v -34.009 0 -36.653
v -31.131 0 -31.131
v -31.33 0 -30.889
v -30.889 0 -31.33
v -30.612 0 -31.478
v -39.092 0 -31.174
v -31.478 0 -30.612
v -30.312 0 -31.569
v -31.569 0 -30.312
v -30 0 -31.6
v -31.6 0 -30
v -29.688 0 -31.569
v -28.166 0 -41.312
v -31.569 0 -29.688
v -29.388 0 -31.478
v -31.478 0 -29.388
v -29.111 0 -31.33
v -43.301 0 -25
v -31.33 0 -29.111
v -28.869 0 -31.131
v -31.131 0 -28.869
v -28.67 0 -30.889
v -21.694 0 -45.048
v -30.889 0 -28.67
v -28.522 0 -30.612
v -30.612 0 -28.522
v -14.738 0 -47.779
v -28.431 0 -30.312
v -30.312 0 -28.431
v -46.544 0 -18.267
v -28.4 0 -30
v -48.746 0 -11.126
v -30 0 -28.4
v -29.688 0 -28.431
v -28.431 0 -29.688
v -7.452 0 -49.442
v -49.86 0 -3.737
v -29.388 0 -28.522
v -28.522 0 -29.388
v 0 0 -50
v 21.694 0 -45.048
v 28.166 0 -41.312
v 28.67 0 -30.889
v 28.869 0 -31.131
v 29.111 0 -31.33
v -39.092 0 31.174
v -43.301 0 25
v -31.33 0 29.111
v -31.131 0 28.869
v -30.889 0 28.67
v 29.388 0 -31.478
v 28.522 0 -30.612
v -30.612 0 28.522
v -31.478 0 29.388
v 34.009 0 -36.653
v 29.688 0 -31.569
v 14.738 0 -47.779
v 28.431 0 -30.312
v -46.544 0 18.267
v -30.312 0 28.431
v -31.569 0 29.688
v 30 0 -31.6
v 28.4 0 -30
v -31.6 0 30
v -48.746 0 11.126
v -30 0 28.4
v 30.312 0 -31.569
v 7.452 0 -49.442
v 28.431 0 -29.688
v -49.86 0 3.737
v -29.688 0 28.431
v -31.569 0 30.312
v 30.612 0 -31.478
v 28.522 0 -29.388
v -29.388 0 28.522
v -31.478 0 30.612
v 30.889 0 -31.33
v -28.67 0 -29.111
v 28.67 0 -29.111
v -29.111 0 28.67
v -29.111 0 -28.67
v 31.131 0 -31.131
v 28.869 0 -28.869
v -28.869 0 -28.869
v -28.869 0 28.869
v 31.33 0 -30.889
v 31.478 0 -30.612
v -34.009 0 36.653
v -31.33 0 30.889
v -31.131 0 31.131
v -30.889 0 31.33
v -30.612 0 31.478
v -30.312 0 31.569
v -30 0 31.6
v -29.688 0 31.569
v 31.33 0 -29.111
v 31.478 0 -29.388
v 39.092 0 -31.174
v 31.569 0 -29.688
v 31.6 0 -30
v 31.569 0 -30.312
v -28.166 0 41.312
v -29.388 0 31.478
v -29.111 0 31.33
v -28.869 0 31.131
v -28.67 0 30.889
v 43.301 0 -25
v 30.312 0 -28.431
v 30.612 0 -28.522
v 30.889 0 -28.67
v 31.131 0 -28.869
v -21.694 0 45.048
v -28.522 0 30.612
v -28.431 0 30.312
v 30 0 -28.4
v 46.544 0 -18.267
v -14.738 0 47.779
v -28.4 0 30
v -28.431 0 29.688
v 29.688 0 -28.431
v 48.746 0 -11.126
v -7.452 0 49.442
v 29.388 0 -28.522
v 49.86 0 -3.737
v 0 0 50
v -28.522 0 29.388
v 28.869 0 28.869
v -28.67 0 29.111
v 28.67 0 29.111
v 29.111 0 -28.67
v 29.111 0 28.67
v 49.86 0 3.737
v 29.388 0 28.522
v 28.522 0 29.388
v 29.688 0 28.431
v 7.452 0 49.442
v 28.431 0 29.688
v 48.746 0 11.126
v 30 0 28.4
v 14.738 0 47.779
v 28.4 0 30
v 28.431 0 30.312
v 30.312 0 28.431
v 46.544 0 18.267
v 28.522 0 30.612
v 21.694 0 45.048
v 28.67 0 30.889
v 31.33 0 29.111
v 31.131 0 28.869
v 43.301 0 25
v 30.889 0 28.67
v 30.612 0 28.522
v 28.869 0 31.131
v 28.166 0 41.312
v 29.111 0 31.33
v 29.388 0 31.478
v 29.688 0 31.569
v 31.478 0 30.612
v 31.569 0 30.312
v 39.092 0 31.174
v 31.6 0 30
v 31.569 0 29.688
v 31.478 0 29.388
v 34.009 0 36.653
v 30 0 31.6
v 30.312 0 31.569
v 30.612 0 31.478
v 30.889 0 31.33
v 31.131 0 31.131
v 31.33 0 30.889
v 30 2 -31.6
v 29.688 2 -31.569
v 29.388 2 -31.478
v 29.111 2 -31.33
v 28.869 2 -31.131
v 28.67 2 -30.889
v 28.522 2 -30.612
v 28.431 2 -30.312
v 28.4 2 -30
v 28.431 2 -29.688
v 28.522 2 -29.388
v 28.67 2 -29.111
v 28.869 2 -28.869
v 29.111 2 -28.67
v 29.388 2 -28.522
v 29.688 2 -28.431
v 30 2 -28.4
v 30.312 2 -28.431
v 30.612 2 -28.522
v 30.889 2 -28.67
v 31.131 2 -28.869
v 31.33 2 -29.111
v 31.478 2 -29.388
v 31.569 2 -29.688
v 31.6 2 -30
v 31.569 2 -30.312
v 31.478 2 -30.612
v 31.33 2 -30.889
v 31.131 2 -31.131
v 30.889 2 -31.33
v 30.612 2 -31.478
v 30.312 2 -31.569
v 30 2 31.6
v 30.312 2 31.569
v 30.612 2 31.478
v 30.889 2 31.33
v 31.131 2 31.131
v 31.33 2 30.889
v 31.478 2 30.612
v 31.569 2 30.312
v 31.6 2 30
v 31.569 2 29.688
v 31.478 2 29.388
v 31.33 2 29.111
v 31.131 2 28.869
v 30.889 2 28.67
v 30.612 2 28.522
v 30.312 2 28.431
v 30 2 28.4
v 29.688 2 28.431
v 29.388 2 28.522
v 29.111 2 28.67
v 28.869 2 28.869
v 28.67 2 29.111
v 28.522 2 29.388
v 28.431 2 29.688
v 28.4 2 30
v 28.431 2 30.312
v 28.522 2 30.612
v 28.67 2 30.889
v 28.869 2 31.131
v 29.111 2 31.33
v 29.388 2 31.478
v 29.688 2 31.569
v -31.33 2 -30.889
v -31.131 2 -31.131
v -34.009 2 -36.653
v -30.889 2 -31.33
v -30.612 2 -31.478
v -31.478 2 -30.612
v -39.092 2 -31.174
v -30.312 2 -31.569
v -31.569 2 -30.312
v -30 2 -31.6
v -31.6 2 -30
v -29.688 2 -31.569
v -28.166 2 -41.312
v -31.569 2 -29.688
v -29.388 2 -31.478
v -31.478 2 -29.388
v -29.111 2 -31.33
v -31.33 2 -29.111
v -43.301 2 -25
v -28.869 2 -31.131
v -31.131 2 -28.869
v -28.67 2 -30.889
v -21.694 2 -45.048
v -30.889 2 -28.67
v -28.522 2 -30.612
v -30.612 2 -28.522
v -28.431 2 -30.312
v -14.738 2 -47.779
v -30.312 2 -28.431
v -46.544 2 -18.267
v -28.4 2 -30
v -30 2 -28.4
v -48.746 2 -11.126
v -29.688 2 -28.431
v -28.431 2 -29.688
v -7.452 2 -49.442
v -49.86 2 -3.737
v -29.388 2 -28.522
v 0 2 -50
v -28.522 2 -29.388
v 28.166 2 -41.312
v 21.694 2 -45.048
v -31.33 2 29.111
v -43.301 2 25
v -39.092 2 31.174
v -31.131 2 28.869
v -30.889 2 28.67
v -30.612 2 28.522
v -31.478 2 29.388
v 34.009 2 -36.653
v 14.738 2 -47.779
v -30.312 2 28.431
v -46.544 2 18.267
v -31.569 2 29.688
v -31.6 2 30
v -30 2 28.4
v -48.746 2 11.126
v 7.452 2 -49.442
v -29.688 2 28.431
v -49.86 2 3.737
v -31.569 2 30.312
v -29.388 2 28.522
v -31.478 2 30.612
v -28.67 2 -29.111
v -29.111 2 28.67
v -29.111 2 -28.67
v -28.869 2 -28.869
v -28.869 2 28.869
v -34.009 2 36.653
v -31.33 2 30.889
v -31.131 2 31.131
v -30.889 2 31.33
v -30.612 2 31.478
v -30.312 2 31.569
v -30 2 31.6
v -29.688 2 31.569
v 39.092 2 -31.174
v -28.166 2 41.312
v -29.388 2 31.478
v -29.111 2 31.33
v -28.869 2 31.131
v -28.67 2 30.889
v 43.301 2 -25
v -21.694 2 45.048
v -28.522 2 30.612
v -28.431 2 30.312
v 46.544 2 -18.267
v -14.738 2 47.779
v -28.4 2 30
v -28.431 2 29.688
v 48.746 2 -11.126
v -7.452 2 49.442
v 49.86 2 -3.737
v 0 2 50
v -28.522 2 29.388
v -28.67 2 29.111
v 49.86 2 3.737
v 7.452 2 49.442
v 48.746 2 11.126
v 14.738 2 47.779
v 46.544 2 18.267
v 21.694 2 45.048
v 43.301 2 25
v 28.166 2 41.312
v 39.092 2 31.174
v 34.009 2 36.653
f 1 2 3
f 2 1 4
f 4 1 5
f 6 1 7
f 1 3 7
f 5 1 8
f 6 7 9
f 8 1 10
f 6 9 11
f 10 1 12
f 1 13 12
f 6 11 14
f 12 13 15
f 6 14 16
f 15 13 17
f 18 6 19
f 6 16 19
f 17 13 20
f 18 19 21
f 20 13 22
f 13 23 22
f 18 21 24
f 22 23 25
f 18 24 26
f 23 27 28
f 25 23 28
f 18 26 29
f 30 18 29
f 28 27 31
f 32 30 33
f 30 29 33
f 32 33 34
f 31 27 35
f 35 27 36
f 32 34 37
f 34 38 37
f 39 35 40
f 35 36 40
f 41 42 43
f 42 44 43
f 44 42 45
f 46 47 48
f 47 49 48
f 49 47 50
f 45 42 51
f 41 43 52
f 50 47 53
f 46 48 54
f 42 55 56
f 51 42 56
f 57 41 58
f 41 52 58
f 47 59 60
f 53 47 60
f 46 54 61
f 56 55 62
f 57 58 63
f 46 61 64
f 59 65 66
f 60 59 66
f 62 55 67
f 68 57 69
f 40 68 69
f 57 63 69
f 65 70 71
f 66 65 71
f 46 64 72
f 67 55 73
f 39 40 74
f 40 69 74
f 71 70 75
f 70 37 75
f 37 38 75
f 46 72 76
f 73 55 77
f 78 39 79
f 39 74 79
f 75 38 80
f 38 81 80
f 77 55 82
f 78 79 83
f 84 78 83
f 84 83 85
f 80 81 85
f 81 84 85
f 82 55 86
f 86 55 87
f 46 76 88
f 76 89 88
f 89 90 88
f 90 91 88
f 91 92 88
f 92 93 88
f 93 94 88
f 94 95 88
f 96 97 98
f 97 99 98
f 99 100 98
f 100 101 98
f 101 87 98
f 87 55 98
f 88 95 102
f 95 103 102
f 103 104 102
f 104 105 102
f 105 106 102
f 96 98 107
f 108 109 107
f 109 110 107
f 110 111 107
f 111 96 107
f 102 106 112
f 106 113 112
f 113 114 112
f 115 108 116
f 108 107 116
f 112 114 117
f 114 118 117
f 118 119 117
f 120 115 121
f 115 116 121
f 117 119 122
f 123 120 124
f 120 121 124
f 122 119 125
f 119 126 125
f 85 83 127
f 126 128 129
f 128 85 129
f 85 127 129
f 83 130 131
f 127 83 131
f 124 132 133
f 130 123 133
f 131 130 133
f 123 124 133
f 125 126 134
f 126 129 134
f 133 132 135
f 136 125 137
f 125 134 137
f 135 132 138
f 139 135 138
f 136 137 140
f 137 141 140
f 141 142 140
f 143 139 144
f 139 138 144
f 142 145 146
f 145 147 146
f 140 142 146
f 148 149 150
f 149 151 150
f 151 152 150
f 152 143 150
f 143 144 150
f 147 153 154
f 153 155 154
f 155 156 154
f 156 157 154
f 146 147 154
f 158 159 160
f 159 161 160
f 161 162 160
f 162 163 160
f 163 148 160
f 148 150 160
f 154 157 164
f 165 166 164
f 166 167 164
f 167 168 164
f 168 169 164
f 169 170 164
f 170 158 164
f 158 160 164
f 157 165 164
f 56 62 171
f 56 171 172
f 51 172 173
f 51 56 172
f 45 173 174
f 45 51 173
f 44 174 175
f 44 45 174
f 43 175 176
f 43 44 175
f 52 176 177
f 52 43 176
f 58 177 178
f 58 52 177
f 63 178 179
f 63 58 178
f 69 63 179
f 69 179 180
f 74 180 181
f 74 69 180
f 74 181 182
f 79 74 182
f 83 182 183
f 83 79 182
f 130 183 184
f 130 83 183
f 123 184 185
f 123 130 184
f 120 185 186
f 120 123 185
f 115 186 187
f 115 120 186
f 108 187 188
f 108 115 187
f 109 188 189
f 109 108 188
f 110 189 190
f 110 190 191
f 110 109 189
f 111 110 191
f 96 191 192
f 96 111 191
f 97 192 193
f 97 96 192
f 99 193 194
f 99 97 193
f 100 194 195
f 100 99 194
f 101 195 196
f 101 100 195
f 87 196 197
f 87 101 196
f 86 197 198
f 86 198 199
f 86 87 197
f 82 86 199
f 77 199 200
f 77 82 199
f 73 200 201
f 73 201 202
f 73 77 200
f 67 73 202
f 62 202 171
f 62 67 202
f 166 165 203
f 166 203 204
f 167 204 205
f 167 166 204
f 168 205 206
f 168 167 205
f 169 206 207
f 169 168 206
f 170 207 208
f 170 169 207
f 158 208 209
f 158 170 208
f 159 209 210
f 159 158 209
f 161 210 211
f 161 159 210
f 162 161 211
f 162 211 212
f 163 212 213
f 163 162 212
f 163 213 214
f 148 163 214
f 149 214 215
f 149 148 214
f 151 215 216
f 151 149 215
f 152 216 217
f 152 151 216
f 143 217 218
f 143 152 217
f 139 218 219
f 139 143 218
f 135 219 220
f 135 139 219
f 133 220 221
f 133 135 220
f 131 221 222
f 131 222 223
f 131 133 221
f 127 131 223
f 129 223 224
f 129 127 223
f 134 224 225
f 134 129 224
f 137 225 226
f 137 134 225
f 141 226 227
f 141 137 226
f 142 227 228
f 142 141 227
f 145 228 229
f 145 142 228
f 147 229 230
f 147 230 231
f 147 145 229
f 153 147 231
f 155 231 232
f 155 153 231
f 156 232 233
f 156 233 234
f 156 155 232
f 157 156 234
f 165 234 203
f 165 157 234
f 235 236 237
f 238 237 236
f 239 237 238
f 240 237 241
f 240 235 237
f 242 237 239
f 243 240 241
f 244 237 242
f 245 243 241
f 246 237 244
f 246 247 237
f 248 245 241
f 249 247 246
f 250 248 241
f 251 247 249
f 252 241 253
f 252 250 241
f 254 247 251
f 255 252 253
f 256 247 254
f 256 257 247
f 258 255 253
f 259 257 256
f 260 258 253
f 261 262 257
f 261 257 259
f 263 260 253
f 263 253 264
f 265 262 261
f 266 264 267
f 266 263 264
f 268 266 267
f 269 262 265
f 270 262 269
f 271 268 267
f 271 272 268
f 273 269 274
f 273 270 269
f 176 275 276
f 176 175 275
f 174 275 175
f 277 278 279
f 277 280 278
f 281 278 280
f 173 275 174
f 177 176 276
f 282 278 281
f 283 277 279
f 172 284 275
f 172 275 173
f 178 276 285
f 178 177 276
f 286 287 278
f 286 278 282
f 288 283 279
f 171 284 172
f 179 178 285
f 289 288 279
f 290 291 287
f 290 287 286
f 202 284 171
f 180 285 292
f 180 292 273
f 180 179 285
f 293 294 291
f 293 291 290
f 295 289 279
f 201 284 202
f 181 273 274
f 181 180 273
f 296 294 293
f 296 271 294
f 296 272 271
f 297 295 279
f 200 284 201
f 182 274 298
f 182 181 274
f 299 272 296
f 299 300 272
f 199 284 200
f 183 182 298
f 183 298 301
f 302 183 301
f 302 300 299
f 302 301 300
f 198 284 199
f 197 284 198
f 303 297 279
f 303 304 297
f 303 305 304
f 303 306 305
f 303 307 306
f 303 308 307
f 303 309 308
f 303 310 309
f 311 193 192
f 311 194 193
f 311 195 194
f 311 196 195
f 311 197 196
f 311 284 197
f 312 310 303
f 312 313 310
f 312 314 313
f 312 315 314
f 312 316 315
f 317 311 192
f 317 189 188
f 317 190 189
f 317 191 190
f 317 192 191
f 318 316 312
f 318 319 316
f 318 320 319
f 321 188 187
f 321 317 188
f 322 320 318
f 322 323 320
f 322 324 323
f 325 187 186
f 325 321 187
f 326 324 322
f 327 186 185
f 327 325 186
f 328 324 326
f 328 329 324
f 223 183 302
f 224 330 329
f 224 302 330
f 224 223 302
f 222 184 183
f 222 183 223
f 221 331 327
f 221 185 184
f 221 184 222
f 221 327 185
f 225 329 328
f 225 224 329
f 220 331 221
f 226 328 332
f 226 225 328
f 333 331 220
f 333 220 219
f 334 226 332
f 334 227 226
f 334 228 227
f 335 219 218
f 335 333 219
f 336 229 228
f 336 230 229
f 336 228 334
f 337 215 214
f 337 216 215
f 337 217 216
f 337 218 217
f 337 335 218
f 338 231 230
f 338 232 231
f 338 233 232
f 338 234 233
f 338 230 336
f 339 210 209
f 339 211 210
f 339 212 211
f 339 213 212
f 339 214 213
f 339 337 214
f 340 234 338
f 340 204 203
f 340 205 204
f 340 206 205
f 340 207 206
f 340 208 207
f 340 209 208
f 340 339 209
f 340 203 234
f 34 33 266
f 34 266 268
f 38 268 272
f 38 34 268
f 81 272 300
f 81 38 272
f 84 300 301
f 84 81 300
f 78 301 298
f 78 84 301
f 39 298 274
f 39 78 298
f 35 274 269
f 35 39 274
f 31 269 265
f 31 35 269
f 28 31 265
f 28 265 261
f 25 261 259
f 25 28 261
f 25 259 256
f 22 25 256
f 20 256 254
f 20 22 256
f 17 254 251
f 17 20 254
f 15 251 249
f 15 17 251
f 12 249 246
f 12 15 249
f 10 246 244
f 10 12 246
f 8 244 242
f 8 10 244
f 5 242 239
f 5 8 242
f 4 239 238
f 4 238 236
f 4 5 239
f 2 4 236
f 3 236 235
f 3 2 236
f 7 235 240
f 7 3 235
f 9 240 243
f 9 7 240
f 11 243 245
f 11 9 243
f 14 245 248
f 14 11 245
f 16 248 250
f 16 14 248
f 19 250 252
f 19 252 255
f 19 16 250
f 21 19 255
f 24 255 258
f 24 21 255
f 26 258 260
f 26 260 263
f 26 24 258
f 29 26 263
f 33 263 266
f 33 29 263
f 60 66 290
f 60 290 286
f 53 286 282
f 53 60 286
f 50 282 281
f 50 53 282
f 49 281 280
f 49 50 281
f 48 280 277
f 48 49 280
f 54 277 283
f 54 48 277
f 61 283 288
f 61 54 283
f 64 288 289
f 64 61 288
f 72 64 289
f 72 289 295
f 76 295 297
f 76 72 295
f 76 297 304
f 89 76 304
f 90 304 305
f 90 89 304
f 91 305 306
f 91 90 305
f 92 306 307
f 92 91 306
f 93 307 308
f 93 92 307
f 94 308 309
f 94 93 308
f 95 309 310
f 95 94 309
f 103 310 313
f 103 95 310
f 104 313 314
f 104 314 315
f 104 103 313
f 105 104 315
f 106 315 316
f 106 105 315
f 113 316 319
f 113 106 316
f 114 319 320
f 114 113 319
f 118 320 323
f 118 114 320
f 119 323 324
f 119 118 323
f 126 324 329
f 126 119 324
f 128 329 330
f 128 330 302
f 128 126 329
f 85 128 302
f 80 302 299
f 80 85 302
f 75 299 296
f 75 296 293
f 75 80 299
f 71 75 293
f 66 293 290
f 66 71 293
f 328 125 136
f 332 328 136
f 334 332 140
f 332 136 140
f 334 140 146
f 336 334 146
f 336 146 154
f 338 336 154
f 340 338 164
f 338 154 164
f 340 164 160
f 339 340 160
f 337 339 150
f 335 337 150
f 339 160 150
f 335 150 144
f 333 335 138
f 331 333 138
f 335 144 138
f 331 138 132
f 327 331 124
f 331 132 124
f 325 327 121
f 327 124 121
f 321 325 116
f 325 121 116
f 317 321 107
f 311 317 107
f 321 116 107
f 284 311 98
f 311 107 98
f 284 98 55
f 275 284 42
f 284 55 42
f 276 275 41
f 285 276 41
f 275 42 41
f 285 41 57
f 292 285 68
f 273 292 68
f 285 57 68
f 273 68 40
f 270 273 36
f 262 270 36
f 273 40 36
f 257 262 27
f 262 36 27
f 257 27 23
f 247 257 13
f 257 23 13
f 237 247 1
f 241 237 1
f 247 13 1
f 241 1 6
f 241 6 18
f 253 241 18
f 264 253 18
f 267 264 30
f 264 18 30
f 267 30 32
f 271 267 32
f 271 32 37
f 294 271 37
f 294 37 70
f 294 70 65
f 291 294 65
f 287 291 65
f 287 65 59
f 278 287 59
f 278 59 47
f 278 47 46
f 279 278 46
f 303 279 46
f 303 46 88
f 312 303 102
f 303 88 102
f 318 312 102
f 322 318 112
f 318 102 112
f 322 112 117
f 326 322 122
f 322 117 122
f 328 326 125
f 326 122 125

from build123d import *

# Parameters (mm, degrees)
ESQUISSE1_R        = 50
ESQUISSE1_R_2      = 1.6
BOSS_EXTRU_1_DEPTH = 2


with BuildPart() as part:
    # Esquisse1 → Boss.-Extru.1 (new body)
    with BuildSketch(Plane(origin=(0, 0, 0), x_dir=(1, 0, 0), z_dir=(0, 1, 0))):
        with Locations(Location((0, 0, 0), (0, 0, 270))):
            Circle(ESQUISSE1_R)
        with Locations(Location((-30, 30, 0), (0, 0, 270))):
            Circle(ESQUISSE1_R_2, mode=Mode.SUBTRACT)
        with Locations(Location((30, 30, 0), (0, 0, 90))):
            Circle(ESQUISSE1_R_2, mode=Mode.SUBTRACT)
        with Locations(Location((30, -30, 0), (0, 0, 270))):
            Circle(ESQUISSE1_R_2, mode=Mode.SUBTRACT)
        with Locations(Location((-30, -30, 0), (0, 0, 90))):
            Circle(ESQUISSE1_R_2, mode=Mode.SUBTRACT)
    extrude(amount=BOSS_EXTRU_1_DEPTH)


solid = part.part
